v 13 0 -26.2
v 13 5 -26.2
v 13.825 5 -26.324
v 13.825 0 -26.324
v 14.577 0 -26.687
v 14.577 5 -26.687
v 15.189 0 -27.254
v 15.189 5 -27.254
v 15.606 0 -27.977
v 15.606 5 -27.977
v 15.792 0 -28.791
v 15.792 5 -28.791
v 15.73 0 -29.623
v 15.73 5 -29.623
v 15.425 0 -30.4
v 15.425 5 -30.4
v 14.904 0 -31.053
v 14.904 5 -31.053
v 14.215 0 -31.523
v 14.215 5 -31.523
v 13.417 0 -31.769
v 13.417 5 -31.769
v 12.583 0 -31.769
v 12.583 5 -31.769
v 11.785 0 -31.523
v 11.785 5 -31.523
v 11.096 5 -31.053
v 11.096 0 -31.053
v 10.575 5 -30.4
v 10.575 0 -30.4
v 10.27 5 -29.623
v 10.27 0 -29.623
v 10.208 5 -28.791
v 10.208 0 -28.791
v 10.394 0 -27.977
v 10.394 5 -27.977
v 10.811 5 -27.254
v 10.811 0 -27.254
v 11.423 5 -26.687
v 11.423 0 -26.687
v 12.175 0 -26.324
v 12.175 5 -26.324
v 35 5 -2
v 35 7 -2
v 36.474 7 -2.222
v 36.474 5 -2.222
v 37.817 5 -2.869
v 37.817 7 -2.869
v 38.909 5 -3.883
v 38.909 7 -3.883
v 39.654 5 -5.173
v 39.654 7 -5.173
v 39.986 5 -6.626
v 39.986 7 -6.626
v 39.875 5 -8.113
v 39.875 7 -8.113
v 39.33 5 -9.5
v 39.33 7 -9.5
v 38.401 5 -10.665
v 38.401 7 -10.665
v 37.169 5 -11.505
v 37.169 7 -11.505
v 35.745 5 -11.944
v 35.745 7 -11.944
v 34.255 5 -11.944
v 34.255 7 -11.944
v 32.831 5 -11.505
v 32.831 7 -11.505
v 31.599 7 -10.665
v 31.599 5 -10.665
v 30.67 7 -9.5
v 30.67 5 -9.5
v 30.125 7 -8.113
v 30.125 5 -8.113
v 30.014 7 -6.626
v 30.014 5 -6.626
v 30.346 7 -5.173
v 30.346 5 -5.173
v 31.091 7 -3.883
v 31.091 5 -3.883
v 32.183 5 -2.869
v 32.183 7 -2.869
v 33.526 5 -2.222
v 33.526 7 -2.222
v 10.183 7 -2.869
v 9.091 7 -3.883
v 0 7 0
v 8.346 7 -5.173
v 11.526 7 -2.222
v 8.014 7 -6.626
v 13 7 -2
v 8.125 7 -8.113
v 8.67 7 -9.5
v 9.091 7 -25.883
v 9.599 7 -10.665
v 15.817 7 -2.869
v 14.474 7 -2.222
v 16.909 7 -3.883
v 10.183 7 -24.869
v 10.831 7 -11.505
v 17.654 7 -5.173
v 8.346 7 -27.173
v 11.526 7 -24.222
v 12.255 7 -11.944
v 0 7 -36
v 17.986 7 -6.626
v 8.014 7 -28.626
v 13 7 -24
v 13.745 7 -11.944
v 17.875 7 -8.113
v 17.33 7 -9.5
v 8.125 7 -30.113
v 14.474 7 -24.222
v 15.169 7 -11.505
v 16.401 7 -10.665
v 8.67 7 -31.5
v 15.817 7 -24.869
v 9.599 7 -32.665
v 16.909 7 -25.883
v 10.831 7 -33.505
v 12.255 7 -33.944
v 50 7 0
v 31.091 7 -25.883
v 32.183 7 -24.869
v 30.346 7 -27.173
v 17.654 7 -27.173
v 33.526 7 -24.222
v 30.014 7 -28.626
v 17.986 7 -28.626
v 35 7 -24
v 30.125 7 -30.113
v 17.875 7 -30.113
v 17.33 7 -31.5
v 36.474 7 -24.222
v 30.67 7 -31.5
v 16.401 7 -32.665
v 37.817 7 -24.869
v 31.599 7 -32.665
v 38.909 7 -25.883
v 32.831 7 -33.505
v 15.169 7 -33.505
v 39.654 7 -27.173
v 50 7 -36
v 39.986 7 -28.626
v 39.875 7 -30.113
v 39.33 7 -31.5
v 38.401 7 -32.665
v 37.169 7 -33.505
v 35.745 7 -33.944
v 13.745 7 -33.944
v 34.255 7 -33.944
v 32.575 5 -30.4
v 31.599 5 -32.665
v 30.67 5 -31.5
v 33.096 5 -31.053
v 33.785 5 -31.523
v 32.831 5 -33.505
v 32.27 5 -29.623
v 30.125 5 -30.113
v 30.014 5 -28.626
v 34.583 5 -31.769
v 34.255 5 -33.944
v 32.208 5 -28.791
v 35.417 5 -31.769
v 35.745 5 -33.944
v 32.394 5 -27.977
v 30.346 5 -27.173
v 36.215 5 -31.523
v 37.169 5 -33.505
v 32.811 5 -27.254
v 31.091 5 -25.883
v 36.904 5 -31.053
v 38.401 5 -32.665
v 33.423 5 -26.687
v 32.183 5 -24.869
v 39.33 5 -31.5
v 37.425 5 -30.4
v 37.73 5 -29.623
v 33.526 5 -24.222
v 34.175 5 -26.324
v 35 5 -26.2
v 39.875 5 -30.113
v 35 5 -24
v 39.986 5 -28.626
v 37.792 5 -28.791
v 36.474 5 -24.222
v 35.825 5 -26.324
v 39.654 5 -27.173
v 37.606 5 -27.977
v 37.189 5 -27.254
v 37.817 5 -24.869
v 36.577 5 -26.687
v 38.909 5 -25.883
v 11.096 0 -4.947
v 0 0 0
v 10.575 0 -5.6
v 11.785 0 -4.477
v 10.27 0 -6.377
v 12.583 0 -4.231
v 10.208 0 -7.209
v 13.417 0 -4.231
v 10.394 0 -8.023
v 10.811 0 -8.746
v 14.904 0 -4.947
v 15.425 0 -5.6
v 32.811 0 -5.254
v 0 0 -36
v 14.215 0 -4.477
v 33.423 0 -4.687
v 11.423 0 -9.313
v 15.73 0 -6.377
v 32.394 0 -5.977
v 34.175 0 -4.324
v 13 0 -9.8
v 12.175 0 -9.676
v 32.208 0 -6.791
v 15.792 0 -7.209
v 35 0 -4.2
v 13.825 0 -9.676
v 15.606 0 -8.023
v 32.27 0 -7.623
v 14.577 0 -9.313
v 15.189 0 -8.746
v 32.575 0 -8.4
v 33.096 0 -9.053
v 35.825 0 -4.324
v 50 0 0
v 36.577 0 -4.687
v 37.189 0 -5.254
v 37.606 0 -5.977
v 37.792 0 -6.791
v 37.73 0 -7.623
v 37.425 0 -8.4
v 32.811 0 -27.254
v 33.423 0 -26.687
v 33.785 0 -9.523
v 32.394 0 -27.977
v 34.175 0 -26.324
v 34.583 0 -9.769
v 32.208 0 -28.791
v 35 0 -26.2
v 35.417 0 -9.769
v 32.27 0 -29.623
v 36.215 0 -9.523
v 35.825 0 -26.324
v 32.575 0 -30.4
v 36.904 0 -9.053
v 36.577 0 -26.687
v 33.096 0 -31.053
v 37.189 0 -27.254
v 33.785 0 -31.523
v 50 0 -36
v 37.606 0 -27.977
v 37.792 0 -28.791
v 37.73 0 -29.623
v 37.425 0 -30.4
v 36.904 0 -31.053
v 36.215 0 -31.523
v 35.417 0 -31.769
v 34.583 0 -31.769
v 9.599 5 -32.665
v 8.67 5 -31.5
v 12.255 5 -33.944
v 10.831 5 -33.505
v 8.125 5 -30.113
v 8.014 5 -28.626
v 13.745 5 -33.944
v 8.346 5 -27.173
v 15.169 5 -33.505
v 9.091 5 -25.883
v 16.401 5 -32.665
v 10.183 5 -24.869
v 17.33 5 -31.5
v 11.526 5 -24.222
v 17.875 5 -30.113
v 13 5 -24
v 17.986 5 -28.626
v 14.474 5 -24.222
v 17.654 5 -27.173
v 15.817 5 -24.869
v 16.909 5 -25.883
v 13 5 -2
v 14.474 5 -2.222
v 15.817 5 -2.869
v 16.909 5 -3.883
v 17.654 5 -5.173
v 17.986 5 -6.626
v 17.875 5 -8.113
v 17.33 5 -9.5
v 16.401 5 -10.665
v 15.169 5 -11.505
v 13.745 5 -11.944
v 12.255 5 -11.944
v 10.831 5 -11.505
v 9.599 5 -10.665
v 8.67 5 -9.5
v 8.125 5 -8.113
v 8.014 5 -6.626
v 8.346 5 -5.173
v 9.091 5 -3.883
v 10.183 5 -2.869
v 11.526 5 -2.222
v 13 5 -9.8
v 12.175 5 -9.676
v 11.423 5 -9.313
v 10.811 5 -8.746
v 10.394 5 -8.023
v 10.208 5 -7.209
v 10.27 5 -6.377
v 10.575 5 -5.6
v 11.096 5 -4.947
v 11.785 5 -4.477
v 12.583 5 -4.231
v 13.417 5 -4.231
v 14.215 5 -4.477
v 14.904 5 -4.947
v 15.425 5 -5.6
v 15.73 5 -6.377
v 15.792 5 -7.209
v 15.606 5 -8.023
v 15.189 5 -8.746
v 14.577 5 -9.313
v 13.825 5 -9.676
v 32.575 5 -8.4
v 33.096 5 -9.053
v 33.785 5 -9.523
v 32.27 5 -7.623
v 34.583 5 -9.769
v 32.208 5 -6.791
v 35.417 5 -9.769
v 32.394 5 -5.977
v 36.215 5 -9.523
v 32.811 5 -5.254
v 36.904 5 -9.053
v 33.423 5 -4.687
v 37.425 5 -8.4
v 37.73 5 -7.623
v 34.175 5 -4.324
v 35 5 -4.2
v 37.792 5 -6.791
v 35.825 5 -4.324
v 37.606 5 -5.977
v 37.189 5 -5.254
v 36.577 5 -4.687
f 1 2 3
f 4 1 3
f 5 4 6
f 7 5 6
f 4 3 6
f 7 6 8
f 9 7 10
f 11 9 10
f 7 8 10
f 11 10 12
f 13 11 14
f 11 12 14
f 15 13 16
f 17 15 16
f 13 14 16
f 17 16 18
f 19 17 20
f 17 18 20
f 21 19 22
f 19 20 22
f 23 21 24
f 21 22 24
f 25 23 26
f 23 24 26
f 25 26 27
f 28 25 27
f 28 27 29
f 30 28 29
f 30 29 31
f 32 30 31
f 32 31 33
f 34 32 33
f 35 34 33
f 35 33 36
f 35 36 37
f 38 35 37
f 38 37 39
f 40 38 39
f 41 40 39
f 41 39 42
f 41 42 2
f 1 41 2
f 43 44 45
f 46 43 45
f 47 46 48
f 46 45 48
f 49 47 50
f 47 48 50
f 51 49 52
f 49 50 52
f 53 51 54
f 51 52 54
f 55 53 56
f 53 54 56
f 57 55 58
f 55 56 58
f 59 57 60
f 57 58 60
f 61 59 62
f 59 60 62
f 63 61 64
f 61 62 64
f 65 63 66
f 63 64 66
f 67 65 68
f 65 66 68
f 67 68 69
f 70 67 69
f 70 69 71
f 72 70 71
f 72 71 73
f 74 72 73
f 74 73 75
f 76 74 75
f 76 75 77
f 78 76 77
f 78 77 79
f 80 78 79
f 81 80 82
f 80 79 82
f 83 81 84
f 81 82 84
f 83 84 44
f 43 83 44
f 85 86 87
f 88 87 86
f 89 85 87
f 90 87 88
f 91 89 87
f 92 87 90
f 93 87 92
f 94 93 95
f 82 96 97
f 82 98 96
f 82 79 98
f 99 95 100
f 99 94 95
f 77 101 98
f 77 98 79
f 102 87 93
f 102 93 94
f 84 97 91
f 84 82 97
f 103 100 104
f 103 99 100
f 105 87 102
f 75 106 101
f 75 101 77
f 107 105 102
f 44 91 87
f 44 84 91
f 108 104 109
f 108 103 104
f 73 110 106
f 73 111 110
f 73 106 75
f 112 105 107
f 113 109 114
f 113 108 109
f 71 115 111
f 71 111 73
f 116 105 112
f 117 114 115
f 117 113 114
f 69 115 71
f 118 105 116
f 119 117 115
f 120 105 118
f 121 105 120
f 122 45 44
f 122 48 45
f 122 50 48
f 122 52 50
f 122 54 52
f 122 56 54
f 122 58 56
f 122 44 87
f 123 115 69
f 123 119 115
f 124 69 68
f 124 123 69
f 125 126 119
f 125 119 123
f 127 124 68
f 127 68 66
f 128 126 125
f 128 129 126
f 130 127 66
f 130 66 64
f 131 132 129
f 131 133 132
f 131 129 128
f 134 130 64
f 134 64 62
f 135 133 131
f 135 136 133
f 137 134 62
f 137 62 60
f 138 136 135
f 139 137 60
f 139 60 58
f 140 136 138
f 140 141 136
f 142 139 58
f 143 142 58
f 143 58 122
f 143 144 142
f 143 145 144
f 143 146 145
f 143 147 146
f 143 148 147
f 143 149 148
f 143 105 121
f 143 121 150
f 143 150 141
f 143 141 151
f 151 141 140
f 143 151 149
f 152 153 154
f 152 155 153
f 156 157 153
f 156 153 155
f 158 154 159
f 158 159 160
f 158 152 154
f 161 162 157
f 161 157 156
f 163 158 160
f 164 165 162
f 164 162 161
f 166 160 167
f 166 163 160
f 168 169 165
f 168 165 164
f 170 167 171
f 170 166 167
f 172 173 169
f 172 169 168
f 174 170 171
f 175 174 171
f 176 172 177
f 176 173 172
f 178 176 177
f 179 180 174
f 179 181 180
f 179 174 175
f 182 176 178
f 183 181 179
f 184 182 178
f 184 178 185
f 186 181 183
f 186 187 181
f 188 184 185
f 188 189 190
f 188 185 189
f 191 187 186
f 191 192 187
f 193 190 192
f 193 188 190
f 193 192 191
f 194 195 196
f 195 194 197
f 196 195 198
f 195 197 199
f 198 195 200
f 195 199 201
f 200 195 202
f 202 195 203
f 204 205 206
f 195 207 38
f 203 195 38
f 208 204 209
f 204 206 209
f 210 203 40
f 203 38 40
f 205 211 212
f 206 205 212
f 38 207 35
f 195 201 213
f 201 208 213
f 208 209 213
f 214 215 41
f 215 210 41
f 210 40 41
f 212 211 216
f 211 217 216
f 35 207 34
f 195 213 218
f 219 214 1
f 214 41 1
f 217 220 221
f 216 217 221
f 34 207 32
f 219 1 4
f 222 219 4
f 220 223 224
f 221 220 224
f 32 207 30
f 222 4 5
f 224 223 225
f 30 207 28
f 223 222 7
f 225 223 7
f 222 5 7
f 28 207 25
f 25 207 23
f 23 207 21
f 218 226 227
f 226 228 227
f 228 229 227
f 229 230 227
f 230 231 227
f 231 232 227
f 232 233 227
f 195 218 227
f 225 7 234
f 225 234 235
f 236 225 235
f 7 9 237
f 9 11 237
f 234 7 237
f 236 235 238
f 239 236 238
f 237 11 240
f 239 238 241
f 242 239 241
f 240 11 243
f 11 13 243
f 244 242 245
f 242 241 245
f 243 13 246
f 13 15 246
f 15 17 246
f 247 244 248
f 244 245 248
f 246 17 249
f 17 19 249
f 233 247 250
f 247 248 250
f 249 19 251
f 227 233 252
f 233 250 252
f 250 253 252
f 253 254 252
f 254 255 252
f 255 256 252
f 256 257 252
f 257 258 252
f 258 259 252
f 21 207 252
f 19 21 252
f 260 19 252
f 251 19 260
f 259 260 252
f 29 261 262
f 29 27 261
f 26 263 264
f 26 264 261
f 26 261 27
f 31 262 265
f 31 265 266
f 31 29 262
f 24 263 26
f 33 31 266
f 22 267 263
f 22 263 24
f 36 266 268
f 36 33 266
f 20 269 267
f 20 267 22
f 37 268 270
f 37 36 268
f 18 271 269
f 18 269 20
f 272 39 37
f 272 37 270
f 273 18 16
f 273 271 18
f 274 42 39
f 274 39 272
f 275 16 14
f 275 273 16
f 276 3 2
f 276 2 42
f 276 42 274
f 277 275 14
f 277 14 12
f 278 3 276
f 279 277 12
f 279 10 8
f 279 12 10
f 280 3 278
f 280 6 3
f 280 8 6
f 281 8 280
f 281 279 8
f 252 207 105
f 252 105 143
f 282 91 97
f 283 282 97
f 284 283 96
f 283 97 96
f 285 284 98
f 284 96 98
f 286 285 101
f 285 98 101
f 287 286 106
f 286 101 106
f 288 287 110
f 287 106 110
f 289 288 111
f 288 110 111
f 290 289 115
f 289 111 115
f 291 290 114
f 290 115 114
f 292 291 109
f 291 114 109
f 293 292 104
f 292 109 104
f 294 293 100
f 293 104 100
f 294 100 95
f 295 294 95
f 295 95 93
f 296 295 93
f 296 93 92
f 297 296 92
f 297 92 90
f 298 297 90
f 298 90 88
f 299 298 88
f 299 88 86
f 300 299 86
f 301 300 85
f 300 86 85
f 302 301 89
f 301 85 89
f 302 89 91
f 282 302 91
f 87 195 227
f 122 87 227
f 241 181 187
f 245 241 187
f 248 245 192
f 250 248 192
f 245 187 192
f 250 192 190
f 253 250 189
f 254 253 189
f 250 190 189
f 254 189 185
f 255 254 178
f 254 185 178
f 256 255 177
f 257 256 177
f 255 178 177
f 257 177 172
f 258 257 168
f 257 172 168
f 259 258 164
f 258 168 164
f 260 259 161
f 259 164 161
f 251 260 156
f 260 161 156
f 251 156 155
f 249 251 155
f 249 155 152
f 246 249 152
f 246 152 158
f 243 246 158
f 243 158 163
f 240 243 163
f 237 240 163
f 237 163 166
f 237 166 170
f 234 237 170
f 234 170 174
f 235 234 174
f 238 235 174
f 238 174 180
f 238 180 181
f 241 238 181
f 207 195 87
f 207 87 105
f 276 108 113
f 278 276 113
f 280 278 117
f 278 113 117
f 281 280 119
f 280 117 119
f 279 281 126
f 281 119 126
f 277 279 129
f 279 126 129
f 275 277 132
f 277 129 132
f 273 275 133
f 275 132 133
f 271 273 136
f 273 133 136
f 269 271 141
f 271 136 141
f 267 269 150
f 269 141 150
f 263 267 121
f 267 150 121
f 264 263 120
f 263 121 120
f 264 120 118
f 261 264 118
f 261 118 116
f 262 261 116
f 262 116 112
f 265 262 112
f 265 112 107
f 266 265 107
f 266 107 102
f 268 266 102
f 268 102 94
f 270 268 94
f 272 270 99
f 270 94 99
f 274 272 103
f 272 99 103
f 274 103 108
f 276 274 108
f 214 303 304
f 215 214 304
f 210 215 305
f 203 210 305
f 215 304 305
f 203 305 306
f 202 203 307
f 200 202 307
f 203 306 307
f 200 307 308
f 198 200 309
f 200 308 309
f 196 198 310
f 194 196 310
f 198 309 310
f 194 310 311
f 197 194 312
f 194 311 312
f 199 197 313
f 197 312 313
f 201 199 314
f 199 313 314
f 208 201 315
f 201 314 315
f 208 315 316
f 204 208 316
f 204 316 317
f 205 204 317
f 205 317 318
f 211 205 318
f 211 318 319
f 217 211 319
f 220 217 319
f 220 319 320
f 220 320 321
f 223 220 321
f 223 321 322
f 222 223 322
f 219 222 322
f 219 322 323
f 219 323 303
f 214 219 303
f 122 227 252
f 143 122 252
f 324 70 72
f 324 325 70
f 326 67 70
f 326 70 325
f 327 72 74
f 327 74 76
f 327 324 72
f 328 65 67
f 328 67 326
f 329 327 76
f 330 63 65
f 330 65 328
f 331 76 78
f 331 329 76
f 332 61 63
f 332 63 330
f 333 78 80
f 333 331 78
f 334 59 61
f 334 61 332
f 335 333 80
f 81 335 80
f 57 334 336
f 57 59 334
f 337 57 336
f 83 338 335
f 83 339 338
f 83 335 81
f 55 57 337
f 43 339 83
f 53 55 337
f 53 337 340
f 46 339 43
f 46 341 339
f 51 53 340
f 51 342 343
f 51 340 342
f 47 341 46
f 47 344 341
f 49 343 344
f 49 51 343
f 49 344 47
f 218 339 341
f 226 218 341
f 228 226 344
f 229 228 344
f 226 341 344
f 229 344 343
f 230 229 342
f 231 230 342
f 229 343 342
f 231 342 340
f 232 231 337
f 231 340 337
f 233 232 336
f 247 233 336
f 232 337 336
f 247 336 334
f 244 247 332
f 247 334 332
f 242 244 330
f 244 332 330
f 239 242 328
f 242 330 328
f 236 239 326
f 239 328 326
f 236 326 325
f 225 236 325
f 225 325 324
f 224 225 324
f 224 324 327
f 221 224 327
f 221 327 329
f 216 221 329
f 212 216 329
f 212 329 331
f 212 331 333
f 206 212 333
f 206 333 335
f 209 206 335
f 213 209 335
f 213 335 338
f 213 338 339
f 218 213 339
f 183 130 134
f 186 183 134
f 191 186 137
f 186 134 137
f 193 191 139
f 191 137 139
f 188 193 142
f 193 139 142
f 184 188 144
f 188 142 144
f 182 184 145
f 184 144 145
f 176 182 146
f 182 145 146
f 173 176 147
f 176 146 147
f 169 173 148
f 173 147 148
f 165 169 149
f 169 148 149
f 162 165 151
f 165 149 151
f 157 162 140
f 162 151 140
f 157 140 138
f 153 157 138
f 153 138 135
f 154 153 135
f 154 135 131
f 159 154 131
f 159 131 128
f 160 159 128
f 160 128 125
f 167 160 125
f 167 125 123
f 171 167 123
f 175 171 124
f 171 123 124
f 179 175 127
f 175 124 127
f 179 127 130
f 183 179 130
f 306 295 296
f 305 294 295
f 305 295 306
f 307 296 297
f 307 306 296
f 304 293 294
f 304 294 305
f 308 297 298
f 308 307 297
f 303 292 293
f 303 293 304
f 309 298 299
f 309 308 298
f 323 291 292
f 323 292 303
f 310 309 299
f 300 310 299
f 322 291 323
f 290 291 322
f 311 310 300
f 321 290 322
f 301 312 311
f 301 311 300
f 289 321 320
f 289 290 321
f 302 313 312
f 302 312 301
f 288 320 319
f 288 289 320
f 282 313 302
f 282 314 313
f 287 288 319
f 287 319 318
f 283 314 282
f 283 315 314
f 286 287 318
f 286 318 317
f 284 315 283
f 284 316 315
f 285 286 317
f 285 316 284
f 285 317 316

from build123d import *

# Parameters (mm, degrees)
SKETCH1_W           = 50
SKETCH1_H           = 36
BOSS_EXTRUDE1_DEPTH = 7
SKETCH2_R           = 2.8
CUT_EXTRUDE1_DEPTH  = 63.008063992
SKETCH3_R           = 5
CUT_EXTRUDE2_DEPTH  = 2


with BuildPart() as part:
    # Sketch1 → Boss-Extrude1 (new body)
    with BuildSketch(Plane(origin=(0, 0, 0), x_dir=(1, 0, 0), z_dir=(0, 1, 0))):
        with Locations((25, 18)):
            Rectangle(SKETCH1_W, SKETCH1_H)
    extrude(amount=BOSS_EXTRUDE1_DEPTH)

    # Sketch2 → Cut-Extrude1 (cut, through all)
    with BuildSketch(Plane(origin=(0, 7, 0), x_dir=(1, 0, 0), z_dir=(0, 1, 0))):
        with Locations(Location((13, 29, 0), (0, 0, 270))):
            Circle(SKETCH2_R)
        with Locations(Location((13, 7, 0), (0, 0, 90))):
            Circle(SKETCH2_R)
        with Locations(Location((35, 29, 0), (0, 0, 270))):
            Circle(SKETCH2_R)
        with Locations(Location((35, 7, 0), (0, 0, 270))):
            Circle(SKETCH2_R)
    extrude(amount=-CUT_EXTRUDE1_DEPTH, mode=Mode.SUBTRACT)

    # Sketch3 → Cut-Extrude2 (cut)
    with BuildSketch(Plane(origin=(0, 7, 0), x_dir=(1, 0, 0), z_dir=(0, 1, 0))):
        with Locations(Location((13, 29, 0), (0, 0, 270))):
            Circle(SKETCH3_R)
        with Locations(Location((13, 7, 0), (0, 0, 270))):
            Circle(SKETCH3_R)
        with Locations(Location((35, 29, 0), (0, 0, 270))):
            Circle(SKETCH3_R)
        with Locations(Location((35, 7, 0), (0, 0, 270))):
            Circle(SKETCH3_R)
    extrude(amount=-CUT_EXTRUDE2_DEPTH, mode=Mode.SUBTRACT)


solid = part.part
